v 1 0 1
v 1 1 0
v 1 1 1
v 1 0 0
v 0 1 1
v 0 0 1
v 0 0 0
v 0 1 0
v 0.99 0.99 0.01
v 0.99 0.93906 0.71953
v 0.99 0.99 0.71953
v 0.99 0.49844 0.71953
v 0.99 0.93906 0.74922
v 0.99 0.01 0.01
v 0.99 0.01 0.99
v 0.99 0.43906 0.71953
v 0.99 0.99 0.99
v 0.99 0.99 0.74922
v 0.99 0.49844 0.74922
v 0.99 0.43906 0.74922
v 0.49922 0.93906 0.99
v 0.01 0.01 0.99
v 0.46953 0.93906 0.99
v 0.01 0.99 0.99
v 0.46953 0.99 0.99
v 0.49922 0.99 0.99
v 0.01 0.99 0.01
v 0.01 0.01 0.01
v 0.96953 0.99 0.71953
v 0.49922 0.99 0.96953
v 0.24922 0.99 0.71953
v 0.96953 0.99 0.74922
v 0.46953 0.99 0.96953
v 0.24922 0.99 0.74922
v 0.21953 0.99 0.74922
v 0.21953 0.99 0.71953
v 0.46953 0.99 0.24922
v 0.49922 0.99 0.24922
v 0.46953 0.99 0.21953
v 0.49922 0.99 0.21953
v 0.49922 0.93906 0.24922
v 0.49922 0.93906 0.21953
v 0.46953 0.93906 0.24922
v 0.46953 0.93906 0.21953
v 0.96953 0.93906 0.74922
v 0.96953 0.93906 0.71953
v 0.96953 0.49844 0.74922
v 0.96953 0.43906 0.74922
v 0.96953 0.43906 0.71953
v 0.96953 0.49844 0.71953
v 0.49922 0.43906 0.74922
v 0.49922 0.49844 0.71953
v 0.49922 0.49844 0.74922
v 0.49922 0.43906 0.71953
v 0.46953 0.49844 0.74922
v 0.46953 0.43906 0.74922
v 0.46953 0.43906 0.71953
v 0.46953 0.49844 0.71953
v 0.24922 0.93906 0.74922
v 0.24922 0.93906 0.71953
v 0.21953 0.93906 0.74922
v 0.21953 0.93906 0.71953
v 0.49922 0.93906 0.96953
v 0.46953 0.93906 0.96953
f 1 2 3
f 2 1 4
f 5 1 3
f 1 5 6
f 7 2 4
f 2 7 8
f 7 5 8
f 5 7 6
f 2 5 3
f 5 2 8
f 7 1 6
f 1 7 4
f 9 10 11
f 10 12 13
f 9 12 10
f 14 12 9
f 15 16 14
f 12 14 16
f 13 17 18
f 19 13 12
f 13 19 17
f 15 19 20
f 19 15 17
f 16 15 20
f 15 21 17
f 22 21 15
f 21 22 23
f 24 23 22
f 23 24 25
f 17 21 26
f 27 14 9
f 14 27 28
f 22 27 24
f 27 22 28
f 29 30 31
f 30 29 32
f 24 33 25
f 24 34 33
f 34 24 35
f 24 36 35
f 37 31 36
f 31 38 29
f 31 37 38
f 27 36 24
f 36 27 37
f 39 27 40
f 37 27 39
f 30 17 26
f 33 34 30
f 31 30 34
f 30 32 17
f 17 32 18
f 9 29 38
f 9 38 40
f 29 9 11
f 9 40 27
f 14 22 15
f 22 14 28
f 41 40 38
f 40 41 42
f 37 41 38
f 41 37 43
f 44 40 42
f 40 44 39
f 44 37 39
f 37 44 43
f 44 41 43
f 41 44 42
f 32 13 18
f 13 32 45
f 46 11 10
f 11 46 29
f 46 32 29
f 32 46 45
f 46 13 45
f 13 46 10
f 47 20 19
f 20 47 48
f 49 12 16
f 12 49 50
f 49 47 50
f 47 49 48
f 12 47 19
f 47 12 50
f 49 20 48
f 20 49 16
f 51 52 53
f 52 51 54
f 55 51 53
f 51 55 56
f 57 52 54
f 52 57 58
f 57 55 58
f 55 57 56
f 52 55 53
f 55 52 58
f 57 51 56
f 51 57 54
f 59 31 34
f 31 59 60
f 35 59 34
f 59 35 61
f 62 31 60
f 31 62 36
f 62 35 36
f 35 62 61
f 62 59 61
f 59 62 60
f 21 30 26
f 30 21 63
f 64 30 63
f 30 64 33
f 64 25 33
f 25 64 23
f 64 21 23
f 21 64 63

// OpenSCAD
translate([0.484375, 0.96875, 0.234375]) color([0.14078313852784263, 0.6451769219884874, 0.9811903017448982]) cube([0.0296875, 0.059375, 0.0296875], center=true);
translate([0.984375, 0.96875, 0.734375]) color([0.8740229692652243, 0.6541461711493592, 0.21289315855754942]) cube([0.0296875, 0.059375, 0.0296875], center=true);
translate([0.984375, 0.46875, 0.734375]) color([0.9328418457966335, 0.42345059226773774, 0.5012376899041451]) cube([0.0296875, 0.059375, 0.0296875], center=true);
translate([0.484375, 0.46875, 0.734375]) color([0.5811541702347708, 0.2791891573101454, 0.2092311813057095]) cube([0.0296875, 0.059375, 0.0296875], center=true);
translate([0.234375, 0.96875, 0.734375]) color([0.9628933046967749, 0.6198760626942967, 0.5999578261672418]) cube([0.0296875, 0.059375, 0.0296875], center=true);
translate([0.484375, 0.96875, 0.984375]) color([0.23874719597172656, 0.5159213977515871, 0.8042715508319355]) cube([0.0296875, 0.059375, 0.0296875], center=true);
color([0.3,0.3,0.3,0.3]) difference() { cube([1,1,1]); translate([0.01,0.01,0.01]) cube([0.98,0.98,0.98]); }
